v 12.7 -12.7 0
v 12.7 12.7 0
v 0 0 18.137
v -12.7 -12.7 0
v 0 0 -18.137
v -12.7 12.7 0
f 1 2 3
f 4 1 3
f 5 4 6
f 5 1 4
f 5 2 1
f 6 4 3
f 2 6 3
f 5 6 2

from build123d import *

# Parameters (mm, degrees)
F0_W      = 25.4
F0_H      = 25.4
F1_DEPTH  = 25.4
F1_TAPER  = 35
F1_FACE_W = 25.4
F1_FACE_H = 25.4


# Not quite as in the source:
# - an extrude whose draft closes it to a point is written as a loft to that point


with BuildPart() as f1:
    # F0 (on Top) → F1 (new body)
    with BuildSketch(Plane.XY):
        Rectangle(F0_W, F0_H)
    extrude(amount=F1_DEPTH, taper=F1_TAPER)

    # F1_face (on face) → F2 section 0
    with BuildSketch(Plane(origin=(0, 0, 0), x_dir=(1, 0, 0), z_dir=(0, 0, -1)), mode=Mode.PRIVATE) as f2_s0:
        Rectangle(F1_FACE_W, F1_FACE_H)
    loft([f2_s0.sketch, Vertex(0, 0, -18.1374796856)], ruled=True)


solid = f1.part
